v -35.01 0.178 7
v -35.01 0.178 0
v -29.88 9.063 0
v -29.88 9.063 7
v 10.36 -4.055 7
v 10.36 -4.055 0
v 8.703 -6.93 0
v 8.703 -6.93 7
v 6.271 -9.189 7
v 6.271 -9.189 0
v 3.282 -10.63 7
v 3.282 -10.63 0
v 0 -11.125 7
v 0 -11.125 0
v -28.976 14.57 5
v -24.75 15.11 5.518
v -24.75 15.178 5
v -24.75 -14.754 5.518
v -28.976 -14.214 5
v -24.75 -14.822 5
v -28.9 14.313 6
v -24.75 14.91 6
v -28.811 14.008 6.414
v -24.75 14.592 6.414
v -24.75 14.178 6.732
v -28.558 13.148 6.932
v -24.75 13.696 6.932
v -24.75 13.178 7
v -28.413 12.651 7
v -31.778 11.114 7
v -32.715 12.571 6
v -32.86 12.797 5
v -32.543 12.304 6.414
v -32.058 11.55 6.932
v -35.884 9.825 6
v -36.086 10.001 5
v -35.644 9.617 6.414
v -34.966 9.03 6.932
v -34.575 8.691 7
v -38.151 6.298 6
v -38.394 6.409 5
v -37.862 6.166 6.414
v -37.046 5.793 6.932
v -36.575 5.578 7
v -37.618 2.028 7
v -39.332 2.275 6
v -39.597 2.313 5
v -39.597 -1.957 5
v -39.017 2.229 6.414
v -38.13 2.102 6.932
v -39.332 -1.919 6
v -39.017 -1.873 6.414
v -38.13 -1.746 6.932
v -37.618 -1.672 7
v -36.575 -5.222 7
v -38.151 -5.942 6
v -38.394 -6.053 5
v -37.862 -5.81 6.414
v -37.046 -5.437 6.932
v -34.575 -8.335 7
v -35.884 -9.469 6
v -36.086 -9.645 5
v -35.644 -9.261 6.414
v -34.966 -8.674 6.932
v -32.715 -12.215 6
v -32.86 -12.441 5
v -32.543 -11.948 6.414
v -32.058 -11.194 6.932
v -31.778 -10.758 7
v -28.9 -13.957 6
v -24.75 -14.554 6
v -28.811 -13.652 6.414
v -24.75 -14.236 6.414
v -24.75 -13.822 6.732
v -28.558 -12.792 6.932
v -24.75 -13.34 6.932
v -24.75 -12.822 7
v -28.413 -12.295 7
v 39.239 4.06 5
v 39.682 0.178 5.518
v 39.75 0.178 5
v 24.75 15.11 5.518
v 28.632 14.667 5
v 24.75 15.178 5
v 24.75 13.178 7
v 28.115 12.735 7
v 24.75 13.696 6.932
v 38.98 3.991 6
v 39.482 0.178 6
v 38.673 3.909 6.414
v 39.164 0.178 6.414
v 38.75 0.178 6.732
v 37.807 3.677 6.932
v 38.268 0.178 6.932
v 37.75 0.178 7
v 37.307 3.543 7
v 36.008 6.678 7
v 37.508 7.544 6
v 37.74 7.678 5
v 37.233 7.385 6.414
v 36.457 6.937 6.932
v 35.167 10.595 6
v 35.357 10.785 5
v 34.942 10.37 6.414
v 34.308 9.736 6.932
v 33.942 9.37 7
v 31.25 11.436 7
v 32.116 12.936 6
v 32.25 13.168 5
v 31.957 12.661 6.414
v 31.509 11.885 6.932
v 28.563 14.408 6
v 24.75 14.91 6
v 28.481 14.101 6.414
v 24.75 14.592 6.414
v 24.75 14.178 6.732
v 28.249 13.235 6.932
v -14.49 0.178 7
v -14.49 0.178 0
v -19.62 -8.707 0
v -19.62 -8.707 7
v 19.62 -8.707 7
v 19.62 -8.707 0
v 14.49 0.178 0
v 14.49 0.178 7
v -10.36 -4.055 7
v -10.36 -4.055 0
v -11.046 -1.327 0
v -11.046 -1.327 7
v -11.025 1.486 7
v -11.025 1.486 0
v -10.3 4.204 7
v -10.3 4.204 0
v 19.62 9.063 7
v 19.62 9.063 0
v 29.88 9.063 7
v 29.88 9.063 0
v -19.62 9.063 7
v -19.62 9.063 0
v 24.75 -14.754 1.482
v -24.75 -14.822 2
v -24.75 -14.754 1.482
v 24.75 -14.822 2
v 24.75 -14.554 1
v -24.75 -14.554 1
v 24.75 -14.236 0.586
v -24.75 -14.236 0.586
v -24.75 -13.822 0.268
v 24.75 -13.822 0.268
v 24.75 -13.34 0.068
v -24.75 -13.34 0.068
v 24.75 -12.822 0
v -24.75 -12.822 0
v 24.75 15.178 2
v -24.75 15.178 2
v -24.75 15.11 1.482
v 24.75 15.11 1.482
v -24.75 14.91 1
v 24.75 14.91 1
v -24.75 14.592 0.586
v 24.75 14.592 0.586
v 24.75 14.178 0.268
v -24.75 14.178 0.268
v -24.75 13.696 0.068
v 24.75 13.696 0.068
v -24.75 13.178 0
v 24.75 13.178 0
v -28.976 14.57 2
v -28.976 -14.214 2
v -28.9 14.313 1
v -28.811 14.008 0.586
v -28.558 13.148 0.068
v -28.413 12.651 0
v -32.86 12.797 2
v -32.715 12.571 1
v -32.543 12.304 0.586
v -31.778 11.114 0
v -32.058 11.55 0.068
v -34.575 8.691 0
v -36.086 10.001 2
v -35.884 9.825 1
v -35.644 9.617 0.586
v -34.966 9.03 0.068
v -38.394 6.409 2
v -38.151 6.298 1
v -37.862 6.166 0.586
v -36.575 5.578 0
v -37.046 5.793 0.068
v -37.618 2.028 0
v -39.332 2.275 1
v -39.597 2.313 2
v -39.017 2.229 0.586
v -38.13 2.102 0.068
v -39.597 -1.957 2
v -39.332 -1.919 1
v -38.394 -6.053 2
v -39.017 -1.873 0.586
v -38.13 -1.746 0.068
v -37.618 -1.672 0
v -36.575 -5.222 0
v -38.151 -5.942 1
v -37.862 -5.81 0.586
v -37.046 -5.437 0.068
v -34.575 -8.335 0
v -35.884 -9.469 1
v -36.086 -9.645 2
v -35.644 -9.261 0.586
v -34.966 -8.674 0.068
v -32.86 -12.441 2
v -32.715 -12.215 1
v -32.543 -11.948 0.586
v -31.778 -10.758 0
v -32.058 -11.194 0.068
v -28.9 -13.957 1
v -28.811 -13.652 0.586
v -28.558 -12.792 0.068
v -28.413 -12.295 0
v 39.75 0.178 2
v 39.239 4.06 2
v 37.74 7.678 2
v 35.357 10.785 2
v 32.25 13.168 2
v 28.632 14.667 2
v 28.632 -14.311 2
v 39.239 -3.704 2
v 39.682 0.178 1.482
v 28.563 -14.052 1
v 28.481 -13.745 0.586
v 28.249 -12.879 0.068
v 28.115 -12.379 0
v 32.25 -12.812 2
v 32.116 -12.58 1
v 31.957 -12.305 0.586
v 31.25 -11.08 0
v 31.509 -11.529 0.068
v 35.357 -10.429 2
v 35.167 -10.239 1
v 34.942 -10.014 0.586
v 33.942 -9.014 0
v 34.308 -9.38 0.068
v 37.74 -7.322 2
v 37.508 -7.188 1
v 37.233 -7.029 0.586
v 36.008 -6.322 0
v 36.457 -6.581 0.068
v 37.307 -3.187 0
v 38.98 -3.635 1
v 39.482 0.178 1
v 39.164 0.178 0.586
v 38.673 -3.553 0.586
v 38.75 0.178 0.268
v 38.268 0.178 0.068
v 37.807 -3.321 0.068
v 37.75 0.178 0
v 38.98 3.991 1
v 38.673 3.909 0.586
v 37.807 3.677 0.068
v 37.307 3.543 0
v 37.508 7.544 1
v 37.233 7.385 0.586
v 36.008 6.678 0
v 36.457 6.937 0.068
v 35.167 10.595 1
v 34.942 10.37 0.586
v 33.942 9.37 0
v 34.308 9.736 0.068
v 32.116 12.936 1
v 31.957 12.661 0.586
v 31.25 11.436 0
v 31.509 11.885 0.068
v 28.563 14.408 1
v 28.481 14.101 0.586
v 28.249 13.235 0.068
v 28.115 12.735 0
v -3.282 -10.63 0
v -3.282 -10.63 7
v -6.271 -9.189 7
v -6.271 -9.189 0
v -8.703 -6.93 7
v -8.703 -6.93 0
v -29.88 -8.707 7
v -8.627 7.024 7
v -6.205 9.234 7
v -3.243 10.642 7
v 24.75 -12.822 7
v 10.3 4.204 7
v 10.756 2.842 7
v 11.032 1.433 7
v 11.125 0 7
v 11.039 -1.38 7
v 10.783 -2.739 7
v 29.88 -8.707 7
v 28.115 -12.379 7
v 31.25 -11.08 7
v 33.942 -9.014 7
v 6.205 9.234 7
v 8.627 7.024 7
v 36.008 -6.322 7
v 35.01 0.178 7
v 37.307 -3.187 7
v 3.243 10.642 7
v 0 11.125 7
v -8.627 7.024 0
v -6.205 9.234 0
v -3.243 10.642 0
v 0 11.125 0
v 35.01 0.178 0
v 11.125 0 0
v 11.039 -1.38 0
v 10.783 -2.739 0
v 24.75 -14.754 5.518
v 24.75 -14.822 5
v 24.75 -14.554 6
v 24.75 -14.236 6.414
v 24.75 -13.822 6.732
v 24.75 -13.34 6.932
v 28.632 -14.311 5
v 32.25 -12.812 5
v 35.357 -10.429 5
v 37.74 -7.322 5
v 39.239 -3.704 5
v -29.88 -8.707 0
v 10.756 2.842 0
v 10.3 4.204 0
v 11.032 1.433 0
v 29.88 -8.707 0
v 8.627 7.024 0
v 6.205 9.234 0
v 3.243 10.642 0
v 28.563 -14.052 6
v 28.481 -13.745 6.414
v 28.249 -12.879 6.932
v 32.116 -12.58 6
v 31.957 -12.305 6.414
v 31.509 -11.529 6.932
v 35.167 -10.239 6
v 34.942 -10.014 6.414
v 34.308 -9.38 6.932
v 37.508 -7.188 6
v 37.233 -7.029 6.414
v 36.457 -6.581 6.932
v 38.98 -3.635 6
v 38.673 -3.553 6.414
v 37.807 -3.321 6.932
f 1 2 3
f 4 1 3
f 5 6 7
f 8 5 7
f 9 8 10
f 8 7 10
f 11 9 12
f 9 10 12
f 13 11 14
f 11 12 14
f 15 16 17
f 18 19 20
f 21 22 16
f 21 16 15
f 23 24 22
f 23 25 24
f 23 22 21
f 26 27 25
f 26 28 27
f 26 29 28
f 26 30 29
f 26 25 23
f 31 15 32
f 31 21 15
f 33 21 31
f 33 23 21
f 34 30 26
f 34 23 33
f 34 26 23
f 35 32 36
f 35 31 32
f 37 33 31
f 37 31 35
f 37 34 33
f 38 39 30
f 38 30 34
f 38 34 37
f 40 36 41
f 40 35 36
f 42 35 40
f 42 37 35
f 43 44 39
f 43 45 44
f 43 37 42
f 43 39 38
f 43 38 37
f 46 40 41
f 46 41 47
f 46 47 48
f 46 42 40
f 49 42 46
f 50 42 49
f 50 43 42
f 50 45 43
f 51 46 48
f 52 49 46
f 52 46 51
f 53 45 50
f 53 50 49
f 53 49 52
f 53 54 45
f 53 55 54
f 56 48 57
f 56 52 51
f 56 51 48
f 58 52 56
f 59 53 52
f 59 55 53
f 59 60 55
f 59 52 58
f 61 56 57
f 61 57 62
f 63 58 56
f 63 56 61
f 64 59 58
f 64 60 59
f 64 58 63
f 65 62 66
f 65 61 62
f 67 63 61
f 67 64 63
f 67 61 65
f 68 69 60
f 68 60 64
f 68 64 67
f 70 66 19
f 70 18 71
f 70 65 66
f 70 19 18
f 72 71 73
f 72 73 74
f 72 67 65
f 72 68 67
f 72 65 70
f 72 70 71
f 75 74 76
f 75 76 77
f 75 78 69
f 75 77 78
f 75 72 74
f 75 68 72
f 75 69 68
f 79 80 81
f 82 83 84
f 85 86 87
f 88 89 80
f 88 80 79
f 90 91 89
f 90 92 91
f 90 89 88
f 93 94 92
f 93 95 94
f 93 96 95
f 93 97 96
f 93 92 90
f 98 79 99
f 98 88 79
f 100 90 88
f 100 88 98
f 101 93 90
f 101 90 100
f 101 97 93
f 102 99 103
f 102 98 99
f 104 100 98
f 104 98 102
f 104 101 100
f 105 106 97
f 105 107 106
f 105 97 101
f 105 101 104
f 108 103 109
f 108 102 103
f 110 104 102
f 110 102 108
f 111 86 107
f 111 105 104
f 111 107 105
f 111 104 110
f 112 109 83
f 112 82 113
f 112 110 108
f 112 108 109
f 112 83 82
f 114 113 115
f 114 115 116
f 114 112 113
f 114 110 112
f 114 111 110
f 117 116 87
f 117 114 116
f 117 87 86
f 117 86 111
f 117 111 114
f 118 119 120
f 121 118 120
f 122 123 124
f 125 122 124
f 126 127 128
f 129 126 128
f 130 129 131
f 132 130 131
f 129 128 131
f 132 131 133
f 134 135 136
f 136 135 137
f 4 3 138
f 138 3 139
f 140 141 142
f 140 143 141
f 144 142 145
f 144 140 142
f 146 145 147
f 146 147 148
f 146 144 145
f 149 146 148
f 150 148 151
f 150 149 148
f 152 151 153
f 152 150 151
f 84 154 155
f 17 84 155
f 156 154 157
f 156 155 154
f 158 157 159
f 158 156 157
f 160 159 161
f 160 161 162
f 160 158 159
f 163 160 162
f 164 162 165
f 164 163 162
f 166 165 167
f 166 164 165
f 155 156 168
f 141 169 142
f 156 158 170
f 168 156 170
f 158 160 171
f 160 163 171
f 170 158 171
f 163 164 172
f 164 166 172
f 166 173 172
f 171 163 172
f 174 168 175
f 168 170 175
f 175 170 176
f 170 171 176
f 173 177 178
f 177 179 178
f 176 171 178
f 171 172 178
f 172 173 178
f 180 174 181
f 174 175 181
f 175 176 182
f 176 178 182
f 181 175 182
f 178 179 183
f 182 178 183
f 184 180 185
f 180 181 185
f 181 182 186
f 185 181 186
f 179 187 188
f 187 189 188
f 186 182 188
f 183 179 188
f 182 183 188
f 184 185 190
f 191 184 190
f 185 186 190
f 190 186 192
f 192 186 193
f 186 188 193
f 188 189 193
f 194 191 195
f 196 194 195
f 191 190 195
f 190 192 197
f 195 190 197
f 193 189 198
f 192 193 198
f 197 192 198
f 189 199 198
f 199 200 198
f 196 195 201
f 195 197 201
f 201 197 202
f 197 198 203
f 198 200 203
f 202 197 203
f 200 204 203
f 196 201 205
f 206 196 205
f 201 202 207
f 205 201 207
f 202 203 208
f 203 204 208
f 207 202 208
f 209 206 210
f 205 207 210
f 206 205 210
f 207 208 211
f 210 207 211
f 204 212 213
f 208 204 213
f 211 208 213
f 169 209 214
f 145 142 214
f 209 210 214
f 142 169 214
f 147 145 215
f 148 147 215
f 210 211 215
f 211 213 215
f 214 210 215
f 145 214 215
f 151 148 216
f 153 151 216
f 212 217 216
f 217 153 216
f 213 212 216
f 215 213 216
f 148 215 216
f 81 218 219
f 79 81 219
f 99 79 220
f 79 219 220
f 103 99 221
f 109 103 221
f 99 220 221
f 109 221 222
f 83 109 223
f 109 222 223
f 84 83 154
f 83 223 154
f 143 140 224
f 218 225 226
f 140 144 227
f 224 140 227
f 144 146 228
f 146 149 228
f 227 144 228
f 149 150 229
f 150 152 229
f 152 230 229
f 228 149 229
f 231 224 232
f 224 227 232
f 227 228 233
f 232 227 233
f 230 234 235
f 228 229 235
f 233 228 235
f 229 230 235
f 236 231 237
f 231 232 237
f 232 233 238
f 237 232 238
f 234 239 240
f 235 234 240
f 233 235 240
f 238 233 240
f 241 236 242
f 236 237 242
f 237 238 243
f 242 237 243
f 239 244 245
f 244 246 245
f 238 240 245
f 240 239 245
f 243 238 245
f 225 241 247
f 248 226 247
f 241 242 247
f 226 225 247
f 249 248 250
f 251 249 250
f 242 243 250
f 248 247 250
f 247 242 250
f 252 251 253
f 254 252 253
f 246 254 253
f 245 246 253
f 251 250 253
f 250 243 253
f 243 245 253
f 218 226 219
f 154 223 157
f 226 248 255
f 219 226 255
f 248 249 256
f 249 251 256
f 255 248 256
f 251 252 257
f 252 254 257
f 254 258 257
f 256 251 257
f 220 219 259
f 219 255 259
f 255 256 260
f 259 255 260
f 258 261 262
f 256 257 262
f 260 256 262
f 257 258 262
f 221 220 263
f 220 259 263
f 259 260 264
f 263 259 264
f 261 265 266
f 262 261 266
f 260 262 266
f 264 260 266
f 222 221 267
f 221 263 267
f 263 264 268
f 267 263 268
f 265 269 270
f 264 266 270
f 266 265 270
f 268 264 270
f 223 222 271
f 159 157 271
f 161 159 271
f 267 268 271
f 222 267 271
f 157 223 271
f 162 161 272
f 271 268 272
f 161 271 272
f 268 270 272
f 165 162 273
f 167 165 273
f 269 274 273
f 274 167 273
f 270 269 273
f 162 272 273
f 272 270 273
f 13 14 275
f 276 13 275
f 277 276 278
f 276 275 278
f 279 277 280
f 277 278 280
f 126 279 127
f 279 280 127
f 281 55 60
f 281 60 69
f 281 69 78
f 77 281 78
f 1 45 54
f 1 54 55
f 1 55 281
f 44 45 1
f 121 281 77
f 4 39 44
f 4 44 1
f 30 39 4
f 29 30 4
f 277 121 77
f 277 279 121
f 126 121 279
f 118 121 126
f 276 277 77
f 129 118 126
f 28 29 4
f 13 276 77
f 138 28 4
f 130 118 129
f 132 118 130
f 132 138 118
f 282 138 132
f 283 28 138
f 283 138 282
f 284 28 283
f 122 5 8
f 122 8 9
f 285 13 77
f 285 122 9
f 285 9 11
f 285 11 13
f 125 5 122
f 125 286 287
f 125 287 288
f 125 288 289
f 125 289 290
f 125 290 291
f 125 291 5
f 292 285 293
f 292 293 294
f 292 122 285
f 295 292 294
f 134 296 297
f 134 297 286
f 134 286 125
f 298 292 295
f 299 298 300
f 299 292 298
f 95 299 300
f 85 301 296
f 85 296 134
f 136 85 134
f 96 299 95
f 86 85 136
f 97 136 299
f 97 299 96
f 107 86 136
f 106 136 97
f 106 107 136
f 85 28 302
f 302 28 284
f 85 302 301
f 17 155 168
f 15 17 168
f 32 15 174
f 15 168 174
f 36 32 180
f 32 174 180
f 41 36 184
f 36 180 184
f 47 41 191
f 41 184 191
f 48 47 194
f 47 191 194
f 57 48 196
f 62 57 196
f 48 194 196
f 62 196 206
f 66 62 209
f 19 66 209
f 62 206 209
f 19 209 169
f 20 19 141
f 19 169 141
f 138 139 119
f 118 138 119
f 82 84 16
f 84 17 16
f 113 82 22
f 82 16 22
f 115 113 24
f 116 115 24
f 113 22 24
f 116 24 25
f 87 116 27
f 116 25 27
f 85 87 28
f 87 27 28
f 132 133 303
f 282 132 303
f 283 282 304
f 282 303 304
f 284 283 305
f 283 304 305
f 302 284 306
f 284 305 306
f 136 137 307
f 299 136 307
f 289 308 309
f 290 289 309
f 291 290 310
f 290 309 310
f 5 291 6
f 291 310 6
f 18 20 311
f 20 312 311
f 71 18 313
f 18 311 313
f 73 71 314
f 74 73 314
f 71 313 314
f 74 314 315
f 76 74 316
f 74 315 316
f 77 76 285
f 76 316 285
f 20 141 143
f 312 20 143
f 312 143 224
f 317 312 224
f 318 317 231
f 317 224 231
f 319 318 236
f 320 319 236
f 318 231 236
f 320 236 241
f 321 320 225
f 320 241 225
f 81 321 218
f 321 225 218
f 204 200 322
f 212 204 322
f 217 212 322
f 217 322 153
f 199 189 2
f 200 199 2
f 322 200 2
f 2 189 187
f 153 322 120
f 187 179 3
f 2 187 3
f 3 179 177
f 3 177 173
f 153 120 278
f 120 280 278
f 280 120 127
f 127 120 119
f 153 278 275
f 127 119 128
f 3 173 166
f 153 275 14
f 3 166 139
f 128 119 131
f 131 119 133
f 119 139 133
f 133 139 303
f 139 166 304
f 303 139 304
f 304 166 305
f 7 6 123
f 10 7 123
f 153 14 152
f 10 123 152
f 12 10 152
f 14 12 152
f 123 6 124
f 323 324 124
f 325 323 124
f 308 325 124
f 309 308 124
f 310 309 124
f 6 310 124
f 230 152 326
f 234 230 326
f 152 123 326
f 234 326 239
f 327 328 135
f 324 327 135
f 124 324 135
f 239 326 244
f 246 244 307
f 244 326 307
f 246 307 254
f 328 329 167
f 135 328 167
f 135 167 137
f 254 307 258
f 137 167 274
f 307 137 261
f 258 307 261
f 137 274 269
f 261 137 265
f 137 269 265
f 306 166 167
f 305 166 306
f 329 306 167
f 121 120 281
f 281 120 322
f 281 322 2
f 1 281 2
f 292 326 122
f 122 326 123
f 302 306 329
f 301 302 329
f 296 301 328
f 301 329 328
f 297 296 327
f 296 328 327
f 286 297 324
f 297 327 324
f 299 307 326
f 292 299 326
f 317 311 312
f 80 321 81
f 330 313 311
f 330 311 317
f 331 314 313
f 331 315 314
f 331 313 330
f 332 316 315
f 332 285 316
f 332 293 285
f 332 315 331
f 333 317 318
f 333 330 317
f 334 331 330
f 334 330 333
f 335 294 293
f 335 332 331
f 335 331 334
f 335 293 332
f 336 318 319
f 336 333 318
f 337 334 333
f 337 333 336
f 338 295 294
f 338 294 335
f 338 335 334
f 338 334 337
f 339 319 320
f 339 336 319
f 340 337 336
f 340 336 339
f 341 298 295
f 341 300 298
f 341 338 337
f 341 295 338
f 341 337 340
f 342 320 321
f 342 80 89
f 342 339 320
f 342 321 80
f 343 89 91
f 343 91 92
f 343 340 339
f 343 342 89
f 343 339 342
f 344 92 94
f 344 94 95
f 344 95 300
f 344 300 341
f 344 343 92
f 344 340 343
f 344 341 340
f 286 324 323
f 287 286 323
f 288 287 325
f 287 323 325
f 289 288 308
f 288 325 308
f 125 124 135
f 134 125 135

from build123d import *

# Parameters (mm, degrees)
F1_DEPTH = 7
F2_R     = 2


with BuildPart() as f1:
    # F0 (on Top) → F1 (new body)
    with BuildSketch(Plane.XY):
        with BuildLine():
            ThreePointArc((-10.359665, -4.054993), (-11.124712, 0.080009), (-10.300269, 4.20358))
            ThreePointArc((-10.300269, 4.20358), (-15.677615, 12.123372), (-24.75, 15.178003))
            Line((-24.75, 15.178003), (-24.75, 9.063003))
            Line((-24.75, 9.063003), (-19.620243, 9.063003))
            Line((-19.620243, 9.063003), (-14.490486, 0.178003))
            Line((-14.490486, 0.178003), (-19.620243, -8.706997))
            Line((-19.620243, -8.706997), (-24.75, -8.706997))
            Line((-24.75, -8.706997), (-24.75, -14.821997))
            ThreePointArc((-24.75, -14.821997), (-15.763759, -11.832304), (-10.359665, -4.054993))
        make_face()
        with BuildLine():
            Line((-24.75, 9.063003), (-24.75, 15.178003))
            ThreePointArc((-24.75, 15.178003), (-39.75, 0.178003), (-24.75, -14.821997))
            Line((-24.75, -14.821997), (-24.75, -8.706997))
            Line((-24.75, -8.706997), (-29.879757, -8.706997))
            Line((-29.879757, -8.706997), (-35.009514, 0.178003))
            Line((-35.009514, 0.178003), (-29.879757, 9.063003))
            Line((-29.879757, 9.063003), (-24.75, 9.063003))
        make_face()
        with BuildLine():
            ThreePointArc((-10.300269, 4.20358), (-6.204869, 9.233917), (0, 11.125))
            Line((0, 11.125), (0, 15.178003))
            Line((0, 15.178003), (-24.75, 15.178003))
            ThreePointArc((-24.75, 15.178003), (-15.677615, 12.123372), (-10.300269, 4.20358))
        make_face()
        with BuildLine():
            ThreePointArc((0, 11.125), (6.204869, 9.233917), (10.300269, 4.20358))
            ThreePointArc((10.300269, 4.20358), (15.677615, 12.123372), (24.75, 15.178003))
            Line((24.75, 15.178003), (0, 15.178003))
            Line((0, 15.178003), (0, 11.125))
        make_face()
        with BuildLine():
            Line((0, -14.821997), (0, -11.125))
            ThreePointArc((0, -11.125), (-6.271117, -9.189054), (-10.359665, -4.054993))
            ThreePointArc((-10.359665, -4.054993), (-15.763759, -11.832304), (-24.75, -14.821997))
            Line((-24.75, -14.821997), (0, -14.821997))
        make_face()
        with BuildLine():
            ThreePointArc((24.75, -14.821997), (15.763759, -11.832304), (10.359665, -4.054993))
            ThreePointArc((10.359665, -4.054993), (6.271117, -9.189054), (0, -11.125))
            Line((0, -11.125), (0, -14.821997))
            Line((0, -14.821997), (24.75, -14.821997))
        make_face()
        with BuildLine():
            ThreePointArc((10.300269, 4.20358), (10.91687, 2.141861), (11.125, 0))
            ThreePointArc((11.125, 0), (10.931992, -2.063293), (10.359665, -4.054993))
            ThreePointArc((10.359665, -4.054993), (15.763759, -11.832304), (24.75, -14.821997))
            Line((24.75, -14.821997), (24.75, -8.706997))
            Line((24.75, -8.706997), (19.620243, -8.706997))
            Line((19.620243, -8.706997), (14.490486, 0.178003))
            Line((14.490486, 0.178003), (19.620243, 9.063003))
            Line((19.620243, 9.063003), (24.75, 9.063003))
            Line((24.75, 9.063003), (24.75, 15.178003))
            ThreePointArc((24.75, 15.178003), (15.677615, 12.123372), (10.300269, 4.20358))
        make_face()
        with BuildLine():
            ThreePointArc((39.75, 0.178003), (35.356602, 10.784605), (24.75, 15.178003))
            Line((24.75, 15.178003), (24.75, 9.063003))
            Line((24.75, 9.063003), (29.879757, 9.063003))
            Line((29.879757, 9.063003), (35.009514, 0.178003))
            Line((35.009514, 0.178003), (29.879757, -8.706997))
            Line((29.879757, -8.706997), (24.75, -8.706997))
            Line((24.75, -8.706997), (24.75, -14.821997))
            ThreePointArc((24.75, -14.821997), (35.356602, -10.428599), (39.75, 0.178003))
        make_face()
    extrude(amount=F1_DEPTH)

    # F2
    f2_edges = [f1.edges().sort_by_distance(p)[0] for p in [
        (0, 15.178003, 7),
        (0, 15.178003, 0),
    ]]
    fillet(f2_edges, radius=F2_R)


solid = f1.part
